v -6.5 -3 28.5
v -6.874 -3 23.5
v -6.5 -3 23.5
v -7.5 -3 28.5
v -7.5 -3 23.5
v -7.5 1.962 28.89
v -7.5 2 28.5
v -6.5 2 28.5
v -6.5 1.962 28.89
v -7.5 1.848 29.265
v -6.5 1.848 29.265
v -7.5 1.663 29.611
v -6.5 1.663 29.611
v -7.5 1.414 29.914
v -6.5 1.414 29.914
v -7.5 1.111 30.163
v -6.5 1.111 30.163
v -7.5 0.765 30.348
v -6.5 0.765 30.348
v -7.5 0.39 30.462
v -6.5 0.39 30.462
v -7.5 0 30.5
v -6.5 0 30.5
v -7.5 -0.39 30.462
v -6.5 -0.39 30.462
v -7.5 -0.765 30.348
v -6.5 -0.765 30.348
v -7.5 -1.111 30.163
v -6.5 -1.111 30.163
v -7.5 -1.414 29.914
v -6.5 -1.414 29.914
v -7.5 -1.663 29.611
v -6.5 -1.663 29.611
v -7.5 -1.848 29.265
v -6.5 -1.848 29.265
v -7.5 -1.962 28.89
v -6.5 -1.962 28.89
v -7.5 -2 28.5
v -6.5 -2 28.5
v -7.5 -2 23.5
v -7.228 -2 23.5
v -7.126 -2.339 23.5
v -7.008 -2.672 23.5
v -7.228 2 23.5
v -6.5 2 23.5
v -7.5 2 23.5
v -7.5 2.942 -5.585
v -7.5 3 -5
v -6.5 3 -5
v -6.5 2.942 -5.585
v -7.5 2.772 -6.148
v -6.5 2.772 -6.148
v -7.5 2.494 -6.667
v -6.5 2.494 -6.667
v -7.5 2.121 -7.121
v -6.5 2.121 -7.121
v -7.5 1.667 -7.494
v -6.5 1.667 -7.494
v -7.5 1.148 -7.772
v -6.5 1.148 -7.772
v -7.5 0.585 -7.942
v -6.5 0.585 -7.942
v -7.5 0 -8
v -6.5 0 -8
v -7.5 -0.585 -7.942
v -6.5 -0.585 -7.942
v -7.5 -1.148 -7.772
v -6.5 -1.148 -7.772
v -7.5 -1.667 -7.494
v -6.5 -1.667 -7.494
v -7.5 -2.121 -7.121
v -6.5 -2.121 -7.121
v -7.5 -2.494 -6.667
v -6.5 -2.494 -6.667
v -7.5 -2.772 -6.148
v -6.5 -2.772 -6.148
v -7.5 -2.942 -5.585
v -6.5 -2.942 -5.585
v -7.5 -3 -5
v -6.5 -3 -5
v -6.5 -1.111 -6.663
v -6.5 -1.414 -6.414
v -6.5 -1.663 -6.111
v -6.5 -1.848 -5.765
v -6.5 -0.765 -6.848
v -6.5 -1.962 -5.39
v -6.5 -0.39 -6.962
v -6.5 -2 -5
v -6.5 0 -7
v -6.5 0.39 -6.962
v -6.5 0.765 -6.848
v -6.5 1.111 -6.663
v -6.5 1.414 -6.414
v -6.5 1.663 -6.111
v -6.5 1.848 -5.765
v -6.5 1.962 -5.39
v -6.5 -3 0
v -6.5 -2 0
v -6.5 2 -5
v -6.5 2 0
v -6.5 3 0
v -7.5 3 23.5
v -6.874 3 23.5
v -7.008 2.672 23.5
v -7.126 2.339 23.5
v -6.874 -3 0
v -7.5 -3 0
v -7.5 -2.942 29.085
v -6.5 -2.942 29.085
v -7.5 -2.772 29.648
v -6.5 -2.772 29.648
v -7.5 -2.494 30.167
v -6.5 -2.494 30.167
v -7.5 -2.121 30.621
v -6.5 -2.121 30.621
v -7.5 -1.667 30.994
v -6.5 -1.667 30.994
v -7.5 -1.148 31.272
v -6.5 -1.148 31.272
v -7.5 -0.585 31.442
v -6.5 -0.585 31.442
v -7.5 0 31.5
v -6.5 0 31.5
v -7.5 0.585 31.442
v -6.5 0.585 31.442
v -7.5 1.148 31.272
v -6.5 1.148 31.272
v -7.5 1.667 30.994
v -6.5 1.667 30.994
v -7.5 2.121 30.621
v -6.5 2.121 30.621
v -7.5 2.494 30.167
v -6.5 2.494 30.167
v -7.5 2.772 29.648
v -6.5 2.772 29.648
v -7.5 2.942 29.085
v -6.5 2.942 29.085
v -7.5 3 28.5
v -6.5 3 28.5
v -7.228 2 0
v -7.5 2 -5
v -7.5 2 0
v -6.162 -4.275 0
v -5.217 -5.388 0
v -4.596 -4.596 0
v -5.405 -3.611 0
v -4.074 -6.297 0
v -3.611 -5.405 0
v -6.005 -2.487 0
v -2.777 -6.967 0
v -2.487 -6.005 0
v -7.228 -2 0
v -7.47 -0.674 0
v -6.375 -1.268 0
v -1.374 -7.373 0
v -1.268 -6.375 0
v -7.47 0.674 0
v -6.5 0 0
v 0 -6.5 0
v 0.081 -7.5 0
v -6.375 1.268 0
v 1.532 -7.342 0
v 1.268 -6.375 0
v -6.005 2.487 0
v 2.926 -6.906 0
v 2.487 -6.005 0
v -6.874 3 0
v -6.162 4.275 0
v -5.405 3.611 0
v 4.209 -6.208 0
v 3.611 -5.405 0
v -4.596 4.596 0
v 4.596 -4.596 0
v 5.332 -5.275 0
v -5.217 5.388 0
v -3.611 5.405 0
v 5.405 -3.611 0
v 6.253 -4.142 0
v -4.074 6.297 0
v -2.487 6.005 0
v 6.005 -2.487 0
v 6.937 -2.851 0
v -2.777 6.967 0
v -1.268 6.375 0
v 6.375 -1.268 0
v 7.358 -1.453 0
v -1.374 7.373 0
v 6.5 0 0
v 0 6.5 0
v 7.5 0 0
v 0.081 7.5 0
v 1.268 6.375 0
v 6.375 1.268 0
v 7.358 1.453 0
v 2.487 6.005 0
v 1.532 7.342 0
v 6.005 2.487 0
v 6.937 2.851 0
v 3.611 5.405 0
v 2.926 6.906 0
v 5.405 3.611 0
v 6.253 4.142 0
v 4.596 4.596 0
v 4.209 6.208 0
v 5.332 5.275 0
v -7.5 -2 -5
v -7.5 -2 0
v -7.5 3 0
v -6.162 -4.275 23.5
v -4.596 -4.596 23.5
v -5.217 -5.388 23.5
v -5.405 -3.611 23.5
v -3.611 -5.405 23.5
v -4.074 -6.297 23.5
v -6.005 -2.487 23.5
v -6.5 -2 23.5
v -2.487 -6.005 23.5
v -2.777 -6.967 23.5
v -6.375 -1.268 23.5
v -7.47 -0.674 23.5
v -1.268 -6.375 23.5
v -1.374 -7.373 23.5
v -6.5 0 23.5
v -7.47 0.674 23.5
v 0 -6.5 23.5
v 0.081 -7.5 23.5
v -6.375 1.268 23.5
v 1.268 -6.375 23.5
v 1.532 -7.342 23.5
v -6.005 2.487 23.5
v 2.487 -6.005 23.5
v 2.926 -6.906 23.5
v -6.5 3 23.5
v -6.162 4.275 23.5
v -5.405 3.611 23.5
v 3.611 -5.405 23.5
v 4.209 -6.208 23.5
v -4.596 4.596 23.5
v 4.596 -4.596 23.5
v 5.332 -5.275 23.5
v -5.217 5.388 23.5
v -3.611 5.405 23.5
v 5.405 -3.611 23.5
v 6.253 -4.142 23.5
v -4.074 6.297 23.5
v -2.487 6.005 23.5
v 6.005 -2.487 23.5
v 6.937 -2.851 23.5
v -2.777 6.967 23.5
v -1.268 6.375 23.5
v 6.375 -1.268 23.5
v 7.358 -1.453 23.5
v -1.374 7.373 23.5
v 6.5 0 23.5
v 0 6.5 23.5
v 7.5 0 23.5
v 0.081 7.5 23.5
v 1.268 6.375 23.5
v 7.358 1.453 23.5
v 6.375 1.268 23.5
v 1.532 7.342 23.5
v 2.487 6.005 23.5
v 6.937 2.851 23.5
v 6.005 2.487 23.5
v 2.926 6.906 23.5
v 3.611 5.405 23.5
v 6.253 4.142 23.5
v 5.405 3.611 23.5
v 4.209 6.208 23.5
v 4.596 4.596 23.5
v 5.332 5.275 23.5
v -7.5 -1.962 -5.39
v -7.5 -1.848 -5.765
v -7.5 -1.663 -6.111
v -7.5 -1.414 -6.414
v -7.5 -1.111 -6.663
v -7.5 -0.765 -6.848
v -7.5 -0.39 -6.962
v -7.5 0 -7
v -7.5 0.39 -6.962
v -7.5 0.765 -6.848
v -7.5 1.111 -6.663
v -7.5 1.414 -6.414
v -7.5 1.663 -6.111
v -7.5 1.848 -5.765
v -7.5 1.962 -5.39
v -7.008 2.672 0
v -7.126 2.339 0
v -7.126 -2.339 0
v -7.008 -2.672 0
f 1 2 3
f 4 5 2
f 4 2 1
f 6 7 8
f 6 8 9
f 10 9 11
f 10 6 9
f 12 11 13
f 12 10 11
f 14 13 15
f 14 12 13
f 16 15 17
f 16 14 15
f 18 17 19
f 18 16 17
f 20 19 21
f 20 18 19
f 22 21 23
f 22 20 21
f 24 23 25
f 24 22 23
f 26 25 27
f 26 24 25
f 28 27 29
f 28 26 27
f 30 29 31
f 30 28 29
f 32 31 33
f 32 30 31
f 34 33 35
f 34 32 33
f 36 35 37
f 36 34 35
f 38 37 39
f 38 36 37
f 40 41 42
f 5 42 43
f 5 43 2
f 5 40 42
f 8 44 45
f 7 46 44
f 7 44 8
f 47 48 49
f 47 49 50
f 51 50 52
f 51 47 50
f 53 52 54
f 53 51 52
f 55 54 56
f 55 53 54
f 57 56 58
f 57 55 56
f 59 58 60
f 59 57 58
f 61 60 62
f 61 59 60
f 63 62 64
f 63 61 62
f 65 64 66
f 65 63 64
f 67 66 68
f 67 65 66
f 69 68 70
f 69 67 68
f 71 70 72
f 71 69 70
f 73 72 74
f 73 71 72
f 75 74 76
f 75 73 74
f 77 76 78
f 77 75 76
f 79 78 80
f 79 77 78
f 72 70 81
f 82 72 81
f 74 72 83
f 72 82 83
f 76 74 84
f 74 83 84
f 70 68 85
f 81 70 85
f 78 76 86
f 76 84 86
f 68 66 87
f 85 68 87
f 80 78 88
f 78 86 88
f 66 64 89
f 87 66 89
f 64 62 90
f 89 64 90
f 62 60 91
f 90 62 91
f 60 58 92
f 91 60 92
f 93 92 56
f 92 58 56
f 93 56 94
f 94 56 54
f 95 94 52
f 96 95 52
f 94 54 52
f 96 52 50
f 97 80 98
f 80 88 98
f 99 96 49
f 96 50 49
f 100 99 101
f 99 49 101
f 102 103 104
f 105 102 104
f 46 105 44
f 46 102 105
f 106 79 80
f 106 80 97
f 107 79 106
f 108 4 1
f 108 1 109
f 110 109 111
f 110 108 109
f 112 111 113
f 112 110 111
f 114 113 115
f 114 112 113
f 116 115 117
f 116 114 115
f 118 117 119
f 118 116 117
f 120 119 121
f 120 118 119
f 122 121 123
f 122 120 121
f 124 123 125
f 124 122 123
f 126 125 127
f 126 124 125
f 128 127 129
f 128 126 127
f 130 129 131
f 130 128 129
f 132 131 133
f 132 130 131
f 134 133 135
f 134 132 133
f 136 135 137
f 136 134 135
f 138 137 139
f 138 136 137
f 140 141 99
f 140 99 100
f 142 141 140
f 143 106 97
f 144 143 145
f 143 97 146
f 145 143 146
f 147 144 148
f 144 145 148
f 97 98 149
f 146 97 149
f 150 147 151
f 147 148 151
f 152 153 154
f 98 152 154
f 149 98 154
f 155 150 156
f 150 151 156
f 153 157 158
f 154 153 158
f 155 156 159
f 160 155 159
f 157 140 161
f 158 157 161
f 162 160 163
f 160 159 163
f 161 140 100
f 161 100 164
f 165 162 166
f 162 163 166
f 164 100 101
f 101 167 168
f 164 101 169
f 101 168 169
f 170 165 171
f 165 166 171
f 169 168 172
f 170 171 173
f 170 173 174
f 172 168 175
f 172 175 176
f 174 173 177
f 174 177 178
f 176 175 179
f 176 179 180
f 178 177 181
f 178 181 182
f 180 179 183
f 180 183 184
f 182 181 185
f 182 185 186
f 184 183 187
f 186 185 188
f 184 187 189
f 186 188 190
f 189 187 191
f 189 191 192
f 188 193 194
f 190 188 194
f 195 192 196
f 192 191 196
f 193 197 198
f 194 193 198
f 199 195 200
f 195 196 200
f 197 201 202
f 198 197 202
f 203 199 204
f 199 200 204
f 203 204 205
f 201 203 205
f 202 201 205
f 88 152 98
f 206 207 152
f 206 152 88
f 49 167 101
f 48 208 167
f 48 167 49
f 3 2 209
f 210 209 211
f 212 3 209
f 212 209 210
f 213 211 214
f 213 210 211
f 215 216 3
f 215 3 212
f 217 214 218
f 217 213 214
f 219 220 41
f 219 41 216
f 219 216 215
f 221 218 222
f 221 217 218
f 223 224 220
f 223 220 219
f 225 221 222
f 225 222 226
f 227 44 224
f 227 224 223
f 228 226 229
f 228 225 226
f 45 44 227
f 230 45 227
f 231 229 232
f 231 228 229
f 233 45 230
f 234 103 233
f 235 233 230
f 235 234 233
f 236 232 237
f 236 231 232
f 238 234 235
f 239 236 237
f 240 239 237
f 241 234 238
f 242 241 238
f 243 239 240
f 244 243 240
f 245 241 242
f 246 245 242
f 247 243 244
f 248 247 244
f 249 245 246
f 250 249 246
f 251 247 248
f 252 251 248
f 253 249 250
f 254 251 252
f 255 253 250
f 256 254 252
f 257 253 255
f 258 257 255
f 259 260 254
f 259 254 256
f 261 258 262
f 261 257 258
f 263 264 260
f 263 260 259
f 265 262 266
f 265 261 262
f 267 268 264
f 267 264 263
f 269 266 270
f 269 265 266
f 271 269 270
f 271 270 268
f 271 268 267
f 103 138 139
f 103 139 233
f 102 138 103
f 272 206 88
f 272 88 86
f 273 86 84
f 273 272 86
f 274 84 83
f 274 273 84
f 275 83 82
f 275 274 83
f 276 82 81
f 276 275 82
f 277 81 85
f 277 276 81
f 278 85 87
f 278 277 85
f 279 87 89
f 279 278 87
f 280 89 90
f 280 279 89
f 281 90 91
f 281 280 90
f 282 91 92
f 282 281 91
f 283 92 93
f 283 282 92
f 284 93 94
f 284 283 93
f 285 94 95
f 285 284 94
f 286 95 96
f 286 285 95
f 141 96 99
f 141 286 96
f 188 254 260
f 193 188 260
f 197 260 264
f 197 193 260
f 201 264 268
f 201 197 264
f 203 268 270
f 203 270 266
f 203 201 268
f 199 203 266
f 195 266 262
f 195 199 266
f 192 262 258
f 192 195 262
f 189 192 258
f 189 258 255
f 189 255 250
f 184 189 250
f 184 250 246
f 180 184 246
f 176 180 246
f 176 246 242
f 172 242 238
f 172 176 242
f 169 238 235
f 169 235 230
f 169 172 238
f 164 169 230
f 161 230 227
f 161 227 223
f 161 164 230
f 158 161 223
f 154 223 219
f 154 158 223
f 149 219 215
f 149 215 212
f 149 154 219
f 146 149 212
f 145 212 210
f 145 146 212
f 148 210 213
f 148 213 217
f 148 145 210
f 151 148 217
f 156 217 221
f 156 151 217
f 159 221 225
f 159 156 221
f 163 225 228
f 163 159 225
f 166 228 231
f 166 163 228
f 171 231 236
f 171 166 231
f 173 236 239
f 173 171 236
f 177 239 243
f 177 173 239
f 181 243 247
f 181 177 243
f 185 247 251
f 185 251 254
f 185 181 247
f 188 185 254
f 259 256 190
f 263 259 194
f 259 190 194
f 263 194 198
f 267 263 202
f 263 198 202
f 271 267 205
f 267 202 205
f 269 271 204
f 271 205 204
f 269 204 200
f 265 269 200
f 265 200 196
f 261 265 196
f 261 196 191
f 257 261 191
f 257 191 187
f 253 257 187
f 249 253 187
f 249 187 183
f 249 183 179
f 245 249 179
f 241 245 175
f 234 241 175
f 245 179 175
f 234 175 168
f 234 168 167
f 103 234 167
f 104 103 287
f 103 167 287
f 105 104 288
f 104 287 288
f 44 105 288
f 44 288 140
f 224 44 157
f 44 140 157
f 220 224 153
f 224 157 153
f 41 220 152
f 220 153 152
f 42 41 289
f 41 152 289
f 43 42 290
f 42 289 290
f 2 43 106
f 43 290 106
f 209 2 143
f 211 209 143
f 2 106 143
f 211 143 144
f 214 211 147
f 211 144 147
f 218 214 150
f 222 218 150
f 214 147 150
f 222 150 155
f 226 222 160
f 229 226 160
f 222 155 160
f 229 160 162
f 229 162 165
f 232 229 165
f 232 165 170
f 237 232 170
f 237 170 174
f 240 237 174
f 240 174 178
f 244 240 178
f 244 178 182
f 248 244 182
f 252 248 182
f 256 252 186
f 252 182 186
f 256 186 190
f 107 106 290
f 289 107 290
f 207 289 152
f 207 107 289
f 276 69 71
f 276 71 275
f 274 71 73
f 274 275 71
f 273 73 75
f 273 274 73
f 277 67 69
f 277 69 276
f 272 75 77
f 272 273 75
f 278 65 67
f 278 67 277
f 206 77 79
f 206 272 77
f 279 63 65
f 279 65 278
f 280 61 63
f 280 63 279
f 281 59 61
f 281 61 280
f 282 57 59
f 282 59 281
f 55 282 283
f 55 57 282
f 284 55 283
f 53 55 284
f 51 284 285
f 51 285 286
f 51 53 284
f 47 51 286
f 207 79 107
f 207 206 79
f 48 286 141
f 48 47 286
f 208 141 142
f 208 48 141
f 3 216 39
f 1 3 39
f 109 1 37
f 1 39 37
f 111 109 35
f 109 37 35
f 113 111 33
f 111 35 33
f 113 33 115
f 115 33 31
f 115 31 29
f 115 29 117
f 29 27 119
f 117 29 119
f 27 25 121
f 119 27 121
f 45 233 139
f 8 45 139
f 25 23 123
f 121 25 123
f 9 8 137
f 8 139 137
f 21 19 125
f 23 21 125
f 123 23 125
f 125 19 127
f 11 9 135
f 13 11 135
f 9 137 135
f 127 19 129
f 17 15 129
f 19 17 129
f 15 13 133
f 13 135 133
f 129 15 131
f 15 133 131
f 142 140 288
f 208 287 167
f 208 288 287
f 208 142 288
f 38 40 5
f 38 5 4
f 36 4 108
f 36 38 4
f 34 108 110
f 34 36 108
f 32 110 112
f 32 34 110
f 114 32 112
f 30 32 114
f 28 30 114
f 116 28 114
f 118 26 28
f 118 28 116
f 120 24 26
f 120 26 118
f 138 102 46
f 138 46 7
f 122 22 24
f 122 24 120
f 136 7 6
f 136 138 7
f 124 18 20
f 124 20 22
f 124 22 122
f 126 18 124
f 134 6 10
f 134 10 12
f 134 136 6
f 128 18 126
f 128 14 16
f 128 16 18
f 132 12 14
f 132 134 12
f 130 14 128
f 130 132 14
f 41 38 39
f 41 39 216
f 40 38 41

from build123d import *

# Parameters (mm, degrees)
ESBO_O2_R                = 7.5
ESBO_O2_R_2              = 6.5
RESSALTO_EXTRUS_O1_DEPTH = 23.5
RESSALTO_EXTRUS_O2_DEPTH = 1


with BuildPart() as part:
    # Esboço2 → Ressalto-extrusão1 (new body)
    with BuildSketch(Plane.XY):
        Circle(ESBO_O2_R)
        Circle(ESBO_O2_R_2, mode=Mode.SUBTRACT)
    extrude(amount=RESSALTO_EXTRUS_O1_DEPTH)

    # Esboço3 → Ressalto-extrusão2 (add)
    with BuildSketch(Plane(origin=(-7.5, 0, 0), x_dir=(0, 0, -1), z_dir=(1, 0, 0))):
        with BuildLine():
            Line((5, 2), (0, 2))
            Line((0, 2), (0, 3))
            Line((0, 3), (5, 3))
            ThreePointArc((5, 3), (8, 0), (5, -3))
            Line((5, -3), (0, -3))
            Line((0, -3), (0, -2))
            Line((0, -2), (5, -2))
            ThreePointArc((5, -2), (7, 0), (5, 2))
        make_face()
        with BuildLine():
            Line((-28.5, 3), (-23.5, 3))
            Line((-23.5, 3), (-23.5, 2))
            Line((-23.5, 2), (-28.5, 2))
            ThreePointArc((-28.5, 2), (-30.5, 0), (-28.5, -2))
            Line((-28.5, -2), (-23.5, -2))
            Line((-23.5, -2), (-23.5, -3))
            Line((-23.5, -3), (-28.5, -3))
            ThreePointArc((-28.5, -3), (-31.5, 0), (-28.5, 3))
        make_face()
    extrude(amount=RESSALTO_EXTRUS_O2_DEPTH)


solid = part.part
